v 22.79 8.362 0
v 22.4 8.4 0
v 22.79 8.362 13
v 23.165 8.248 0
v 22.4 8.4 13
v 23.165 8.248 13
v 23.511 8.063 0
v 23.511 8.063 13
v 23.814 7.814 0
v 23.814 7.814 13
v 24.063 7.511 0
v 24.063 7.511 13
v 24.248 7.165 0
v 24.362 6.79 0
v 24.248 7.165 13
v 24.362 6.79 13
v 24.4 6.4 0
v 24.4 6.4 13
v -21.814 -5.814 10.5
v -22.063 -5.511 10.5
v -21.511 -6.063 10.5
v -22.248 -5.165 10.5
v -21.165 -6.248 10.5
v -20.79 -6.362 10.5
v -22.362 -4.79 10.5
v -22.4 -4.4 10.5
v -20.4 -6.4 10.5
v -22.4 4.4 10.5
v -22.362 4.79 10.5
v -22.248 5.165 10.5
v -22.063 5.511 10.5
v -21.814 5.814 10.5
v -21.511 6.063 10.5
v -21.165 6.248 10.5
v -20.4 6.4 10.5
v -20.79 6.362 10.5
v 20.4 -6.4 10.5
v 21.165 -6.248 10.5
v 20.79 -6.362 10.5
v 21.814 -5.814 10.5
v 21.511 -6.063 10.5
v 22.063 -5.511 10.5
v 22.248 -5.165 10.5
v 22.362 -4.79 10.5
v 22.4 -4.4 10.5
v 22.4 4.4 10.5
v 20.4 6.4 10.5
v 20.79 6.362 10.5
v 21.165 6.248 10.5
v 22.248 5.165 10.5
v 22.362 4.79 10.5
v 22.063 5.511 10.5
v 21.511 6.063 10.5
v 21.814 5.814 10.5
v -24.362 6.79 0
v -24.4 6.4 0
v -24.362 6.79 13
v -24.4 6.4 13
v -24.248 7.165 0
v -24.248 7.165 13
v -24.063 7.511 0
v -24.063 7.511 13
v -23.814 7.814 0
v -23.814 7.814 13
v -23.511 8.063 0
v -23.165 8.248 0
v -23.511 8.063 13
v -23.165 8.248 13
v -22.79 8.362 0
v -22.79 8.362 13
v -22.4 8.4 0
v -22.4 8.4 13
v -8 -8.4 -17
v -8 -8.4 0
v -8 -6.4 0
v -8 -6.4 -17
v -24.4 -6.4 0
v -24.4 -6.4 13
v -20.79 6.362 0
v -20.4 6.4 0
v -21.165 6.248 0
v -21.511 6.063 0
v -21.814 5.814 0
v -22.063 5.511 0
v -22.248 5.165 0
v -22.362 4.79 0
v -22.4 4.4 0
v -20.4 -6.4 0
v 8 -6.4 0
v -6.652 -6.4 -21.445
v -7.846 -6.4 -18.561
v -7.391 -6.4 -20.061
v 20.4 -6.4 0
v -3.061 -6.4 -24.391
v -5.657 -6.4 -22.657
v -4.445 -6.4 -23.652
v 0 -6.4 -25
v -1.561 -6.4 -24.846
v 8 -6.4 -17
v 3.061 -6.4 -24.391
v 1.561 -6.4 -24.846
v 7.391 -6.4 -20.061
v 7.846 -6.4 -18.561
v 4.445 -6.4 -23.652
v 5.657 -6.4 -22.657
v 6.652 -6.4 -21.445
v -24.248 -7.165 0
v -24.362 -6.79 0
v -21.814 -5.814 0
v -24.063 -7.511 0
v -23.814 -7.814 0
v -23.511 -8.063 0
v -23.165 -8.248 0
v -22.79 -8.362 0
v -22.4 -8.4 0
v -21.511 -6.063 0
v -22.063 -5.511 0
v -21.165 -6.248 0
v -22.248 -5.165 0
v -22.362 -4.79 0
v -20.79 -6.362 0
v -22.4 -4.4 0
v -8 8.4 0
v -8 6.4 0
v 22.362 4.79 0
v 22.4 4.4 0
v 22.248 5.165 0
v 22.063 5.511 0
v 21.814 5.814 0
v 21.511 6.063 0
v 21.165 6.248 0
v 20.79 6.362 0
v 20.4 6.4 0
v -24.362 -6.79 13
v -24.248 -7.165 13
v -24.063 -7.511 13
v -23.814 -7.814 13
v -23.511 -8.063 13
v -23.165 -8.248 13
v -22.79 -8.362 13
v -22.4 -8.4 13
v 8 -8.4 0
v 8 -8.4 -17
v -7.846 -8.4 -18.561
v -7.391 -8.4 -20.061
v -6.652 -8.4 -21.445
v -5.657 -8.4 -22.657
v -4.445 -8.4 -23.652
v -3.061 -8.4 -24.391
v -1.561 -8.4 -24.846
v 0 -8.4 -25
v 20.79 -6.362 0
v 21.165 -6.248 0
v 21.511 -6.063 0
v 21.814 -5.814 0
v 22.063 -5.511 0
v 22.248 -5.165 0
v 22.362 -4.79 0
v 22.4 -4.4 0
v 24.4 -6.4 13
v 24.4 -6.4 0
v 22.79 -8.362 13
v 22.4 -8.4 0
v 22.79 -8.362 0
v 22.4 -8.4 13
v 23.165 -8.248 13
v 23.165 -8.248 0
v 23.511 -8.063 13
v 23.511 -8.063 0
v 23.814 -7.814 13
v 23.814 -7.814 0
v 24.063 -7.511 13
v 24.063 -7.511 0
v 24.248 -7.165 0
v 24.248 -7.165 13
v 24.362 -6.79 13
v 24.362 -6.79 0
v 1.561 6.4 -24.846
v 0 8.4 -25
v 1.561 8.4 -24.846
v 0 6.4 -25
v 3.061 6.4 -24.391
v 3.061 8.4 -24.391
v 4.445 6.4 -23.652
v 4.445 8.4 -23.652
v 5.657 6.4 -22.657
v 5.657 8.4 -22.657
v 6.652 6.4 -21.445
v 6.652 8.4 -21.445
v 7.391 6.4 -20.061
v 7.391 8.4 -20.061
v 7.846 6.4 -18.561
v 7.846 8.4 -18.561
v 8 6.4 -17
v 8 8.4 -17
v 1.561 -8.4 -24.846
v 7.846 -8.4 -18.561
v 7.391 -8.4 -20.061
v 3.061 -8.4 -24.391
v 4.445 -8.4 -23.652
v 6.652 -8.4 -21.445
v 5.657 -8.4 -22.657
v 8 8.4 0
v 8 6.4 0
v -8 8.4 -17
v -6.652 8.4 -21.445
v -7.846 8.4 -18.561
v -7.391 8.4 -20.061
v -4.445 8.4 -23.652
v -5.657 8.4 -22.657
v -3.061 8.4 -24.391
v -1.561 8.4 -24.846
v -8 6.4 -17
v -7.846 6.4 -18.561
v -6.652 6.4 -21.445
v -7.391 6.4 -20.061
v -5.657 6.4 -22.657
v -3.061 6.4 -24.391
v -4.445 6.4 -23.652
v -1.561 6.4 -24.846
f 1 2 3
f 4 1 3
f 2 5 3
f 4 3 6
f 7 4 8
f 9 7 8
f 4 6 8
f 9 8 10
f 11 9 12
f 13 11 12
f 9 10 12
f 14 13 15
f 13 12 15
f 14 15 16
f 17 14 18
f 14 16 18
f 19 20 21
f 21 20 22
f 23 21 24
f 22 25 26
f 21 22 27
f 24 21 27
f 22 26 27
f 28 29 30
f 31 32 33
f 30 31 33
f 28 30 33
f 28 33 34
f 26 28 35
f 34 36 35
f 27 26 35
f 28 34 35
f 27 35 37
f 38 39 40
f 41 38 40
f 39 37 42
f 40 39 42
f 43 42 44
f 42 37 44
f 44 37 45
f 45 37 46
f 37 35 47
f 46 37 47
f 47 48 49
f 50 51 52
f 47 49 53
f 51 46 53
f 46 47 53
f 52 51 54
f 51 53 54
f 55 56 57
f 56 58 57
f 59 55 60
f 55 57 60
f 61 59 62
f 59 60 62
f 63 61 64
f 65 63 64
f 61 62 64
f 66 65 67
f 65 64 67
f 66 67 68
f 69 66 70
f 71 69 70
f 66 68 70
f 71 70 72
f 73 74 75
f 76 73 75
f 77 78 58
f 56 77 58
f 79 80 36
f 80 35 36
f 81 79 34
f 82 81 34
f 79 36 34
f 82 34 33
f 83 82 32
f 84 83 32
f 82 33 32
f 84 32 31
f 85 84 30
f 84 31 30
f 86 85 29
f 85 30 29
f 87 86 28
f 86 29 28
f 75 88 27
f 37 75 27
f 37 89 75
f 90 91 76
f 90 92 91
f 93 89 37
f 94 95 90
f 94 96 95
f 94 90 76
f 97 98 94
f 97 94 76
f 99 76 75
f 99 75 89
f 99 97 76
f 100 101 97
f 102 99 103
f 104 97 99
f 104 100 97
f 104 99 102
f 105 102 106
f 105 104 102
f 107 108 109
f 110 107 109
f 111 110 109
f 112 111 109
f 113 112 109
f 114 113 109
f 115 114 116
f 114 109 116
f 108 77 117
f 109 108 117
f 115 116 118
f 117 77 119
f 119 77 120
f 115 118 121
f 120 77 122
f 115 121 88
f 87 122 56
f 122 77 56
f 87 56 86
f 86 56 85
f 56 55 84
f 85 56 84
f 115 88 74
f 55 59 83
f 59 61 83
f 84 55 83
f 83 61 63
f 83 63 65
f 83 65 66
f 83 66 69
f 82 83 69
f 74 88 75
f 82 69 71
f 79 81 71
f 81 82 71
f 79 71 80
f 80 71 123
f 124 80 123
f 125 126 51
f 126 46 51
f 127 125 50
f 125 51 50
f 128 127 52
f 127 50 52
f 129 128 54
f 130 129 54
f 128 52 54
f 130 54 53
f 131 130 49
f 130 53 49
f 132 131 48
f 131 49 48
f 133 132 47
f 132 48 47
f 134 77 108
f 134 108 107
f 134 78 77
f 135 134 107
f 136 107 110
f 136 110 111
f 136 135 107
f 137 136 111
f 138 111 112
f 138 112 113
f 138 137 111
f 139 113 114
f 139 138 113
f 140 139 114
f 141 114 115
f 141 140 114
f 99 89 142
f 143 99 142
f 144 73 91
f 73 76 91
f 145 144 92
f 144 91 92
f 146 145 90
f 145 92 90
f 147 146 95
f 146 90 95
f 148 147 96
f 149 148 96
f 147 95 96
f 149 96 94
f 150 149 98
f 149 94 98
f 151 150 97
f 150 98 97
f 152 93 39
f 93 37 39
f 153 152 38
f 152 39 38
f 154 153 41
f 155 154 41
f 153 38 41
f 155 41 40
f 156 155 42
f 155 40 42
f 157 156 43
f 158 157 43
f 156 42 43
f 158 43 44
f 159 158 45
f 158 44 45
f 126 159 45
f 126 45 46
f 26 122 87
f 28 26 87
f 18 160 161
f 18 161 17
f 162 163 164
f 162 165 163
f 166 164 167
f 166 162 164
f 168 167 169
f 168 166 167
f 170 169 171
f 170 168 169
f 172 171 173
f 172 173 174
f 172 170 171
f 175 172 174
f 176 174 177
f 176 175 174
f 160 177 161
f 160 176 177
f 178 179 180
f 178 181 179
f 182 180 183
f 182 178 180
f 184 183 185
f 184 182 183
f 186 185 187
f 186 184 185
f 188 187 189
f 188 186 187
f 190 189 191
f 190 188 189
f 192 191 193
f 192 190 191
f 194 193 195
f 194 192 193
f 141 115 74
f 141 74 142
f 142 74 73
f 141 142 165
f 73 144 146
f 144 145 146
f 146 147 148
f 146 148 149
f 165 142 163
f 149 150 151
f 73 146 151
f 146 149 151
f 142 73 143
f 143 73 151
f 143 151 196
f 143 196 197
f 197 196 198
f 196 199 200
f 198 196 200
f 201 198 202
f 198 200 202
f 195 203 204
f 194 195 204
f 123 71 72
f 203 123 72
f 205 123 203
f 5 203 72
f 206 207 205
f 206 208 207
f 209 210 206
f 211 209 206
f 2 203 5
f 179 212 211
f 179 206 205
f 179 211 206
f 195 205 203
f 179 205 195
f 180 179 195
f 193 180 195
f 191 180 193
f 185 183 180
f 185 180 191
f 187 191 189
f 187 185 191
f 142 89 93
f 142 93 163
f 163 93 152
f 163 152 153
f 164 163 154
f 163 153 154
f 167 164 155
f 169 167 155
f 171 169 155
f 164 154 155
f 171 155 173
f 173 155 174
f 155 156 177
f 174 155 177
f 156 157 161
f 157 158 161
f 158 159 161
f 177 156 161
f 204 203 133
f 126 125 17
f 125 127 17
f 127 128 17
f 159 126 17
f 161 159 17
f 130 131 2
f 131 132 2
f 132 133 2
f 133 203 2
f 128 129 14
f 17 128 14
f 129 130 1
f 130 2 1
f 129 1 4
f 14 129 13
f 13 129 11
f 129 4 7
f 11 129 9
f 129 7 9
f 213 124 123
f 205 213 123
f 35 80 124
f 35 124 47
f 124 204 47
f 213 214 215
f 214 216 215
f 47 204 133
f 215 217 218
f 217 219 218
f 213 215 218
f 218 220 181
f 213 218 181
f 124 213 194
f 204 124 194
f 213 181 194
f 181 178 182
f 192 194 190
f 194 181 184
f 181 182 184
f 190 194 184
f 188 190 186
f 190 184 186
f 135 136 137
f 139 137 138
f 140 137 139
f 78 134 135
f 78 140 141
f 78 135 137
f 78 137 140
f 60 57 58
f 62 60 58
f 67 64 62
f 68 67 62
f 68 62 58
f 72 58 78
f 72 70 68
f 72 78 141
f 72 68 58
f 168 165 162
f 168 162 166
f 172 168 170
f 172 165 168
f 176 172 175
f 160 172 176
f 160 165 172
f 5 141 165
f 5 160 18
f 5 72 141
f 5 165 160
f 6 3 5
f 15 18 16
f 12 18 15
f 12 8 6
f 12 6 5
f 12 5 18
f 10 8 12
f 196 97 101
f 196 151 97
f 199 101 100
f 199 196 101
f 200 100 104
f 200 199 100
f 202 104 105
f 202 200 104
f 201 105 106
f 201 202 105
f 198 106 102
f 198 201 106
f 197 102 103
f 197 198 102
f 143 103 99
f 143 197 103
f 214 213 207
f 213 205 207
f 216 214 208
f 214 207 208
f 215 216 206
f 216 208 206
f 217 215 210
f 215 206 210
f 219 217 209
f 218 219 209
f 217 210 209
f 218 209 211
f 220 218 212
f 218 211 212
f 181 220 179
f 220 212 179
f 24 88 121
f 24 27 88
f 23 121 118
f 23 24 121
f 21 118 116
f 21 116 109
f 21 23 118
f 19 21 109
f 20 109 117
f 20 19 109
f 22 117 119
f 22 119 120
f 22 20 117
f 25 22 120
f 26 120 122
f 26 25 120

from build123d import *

# Parameters (mm, degrees)
F0_W     = 48.799998641
F0_H     = 16.799998641
F0_W_2   = 44.799998641
F0_H_2   = 12.799998641
F0_W_3   = 44
F0_H_3   = 12
F0_W_4   = 40
F0_H_4   = 8
F1_DEPTH = 13
F2_DEPTH = 10.5
F3_R     = 2
F4_R     = 2
F6_DEPTH = 25
F7_R     = 7.99999


# Not quite as in the source:
# - a fillet or chamfer is up to 0.001 mm smaller than in the source, because OpenCascade refuses the exact size


with BuildPart() as f1:
    # F0 (on Top) → F1 (new body)
    with BuildSketch(Plane.XY):
        Rectangle(F0_W, F0_H)
        Rectangle(F0_W_2, F0_H_2, mode=Mode.SUBTRACT)
        Rectangle(F0_W_2, F0_H_2)
        Rectangle(F0_W_3, F0_H_3, mode=Mode.SUBTRACT)
        Rectangle(F0_W_3, F0_H_3)
        Rectangle(F0_W_4, F0_H_4, mode=Mode.SUBTRACT)
        Rectangle(F0_W_4, F0_H_4)
    extrude(amount=F1_DEPTH)

    # F0 (on Top) → F2 (cut)
    with BuildSketch(Plane.XY):
        Rectangle(F0_W_2, F0_H_2)
        Rectangle(F0_W_3, F0_H_3, mode=Mode.SUBTRACT)
        Rectangle(F0_W_3, F0_H_3)
        Rectangle(F0_W_4, F0_H_4, mode=Mode.SUBTRACT)
        Rectangle(F0_W_4, F0_H_4)
    extrude(amount=F2_DEPTH, mode=Mode.SUBTRACT)

    # F3
    f3_edges = [f1.edges().sort_by_distance(p)[0] for p in [
        (-24.399999, -8.399999, 6.5),
        (-24.399999, 8.399999, 6.5),
        (24.399999, -8.399999, 6.5),
        (24.399999, 8.399999, 6.5),
    ]]
    fillet(f3_edges, radius=F3_R)

    # F4
    f4_edges = [f1.edges().sort_by_distance(p)[0] for p in [
        (-22.399999, -6.399999, 5.25),
        (22.399999, -6.399999, 5.25),
        (22.399999, 6.399999, 5.25),
        (-22.399999, 6.399999, 5.25),
    ]]
    fillet(f4_edges, radius=F4_R)

    # F5 (on face) → F6 (join)
    with BuildSketch(Plane(origin=(0, 0, 0), x_dir=(1, 0, 0), z_dir=(0, 0, -1))):
        Polygon((-8, 6.3999993205), (0, 6.3999993205), (8, 6.3999993205), (8, 8.3999993205), (-8, 8.3999993205), align=None)
        Polygon((8, -8.3999993205), (8, -6.3999993205), (0, -6.3999993205), (-8, -6.3999993205), (-8, -8.3999993205), align=None)
    extrude(amount=F6_DEPTH)

    # F7 (radius 8 in the source; OpenCascade refuses exactly that, so slightly less here)
    f7_edges = [f1.edges().sort_by_distance(p)[0] for p in [
        (-8, -7.399999, -25),
        (8, -7.399999, -25),
        (-8, 7.399999, -25),
        (8, 7.399999, -25),
    ]]
    fillet(f7_edges, radius=F7_R)


solid = f1.part
